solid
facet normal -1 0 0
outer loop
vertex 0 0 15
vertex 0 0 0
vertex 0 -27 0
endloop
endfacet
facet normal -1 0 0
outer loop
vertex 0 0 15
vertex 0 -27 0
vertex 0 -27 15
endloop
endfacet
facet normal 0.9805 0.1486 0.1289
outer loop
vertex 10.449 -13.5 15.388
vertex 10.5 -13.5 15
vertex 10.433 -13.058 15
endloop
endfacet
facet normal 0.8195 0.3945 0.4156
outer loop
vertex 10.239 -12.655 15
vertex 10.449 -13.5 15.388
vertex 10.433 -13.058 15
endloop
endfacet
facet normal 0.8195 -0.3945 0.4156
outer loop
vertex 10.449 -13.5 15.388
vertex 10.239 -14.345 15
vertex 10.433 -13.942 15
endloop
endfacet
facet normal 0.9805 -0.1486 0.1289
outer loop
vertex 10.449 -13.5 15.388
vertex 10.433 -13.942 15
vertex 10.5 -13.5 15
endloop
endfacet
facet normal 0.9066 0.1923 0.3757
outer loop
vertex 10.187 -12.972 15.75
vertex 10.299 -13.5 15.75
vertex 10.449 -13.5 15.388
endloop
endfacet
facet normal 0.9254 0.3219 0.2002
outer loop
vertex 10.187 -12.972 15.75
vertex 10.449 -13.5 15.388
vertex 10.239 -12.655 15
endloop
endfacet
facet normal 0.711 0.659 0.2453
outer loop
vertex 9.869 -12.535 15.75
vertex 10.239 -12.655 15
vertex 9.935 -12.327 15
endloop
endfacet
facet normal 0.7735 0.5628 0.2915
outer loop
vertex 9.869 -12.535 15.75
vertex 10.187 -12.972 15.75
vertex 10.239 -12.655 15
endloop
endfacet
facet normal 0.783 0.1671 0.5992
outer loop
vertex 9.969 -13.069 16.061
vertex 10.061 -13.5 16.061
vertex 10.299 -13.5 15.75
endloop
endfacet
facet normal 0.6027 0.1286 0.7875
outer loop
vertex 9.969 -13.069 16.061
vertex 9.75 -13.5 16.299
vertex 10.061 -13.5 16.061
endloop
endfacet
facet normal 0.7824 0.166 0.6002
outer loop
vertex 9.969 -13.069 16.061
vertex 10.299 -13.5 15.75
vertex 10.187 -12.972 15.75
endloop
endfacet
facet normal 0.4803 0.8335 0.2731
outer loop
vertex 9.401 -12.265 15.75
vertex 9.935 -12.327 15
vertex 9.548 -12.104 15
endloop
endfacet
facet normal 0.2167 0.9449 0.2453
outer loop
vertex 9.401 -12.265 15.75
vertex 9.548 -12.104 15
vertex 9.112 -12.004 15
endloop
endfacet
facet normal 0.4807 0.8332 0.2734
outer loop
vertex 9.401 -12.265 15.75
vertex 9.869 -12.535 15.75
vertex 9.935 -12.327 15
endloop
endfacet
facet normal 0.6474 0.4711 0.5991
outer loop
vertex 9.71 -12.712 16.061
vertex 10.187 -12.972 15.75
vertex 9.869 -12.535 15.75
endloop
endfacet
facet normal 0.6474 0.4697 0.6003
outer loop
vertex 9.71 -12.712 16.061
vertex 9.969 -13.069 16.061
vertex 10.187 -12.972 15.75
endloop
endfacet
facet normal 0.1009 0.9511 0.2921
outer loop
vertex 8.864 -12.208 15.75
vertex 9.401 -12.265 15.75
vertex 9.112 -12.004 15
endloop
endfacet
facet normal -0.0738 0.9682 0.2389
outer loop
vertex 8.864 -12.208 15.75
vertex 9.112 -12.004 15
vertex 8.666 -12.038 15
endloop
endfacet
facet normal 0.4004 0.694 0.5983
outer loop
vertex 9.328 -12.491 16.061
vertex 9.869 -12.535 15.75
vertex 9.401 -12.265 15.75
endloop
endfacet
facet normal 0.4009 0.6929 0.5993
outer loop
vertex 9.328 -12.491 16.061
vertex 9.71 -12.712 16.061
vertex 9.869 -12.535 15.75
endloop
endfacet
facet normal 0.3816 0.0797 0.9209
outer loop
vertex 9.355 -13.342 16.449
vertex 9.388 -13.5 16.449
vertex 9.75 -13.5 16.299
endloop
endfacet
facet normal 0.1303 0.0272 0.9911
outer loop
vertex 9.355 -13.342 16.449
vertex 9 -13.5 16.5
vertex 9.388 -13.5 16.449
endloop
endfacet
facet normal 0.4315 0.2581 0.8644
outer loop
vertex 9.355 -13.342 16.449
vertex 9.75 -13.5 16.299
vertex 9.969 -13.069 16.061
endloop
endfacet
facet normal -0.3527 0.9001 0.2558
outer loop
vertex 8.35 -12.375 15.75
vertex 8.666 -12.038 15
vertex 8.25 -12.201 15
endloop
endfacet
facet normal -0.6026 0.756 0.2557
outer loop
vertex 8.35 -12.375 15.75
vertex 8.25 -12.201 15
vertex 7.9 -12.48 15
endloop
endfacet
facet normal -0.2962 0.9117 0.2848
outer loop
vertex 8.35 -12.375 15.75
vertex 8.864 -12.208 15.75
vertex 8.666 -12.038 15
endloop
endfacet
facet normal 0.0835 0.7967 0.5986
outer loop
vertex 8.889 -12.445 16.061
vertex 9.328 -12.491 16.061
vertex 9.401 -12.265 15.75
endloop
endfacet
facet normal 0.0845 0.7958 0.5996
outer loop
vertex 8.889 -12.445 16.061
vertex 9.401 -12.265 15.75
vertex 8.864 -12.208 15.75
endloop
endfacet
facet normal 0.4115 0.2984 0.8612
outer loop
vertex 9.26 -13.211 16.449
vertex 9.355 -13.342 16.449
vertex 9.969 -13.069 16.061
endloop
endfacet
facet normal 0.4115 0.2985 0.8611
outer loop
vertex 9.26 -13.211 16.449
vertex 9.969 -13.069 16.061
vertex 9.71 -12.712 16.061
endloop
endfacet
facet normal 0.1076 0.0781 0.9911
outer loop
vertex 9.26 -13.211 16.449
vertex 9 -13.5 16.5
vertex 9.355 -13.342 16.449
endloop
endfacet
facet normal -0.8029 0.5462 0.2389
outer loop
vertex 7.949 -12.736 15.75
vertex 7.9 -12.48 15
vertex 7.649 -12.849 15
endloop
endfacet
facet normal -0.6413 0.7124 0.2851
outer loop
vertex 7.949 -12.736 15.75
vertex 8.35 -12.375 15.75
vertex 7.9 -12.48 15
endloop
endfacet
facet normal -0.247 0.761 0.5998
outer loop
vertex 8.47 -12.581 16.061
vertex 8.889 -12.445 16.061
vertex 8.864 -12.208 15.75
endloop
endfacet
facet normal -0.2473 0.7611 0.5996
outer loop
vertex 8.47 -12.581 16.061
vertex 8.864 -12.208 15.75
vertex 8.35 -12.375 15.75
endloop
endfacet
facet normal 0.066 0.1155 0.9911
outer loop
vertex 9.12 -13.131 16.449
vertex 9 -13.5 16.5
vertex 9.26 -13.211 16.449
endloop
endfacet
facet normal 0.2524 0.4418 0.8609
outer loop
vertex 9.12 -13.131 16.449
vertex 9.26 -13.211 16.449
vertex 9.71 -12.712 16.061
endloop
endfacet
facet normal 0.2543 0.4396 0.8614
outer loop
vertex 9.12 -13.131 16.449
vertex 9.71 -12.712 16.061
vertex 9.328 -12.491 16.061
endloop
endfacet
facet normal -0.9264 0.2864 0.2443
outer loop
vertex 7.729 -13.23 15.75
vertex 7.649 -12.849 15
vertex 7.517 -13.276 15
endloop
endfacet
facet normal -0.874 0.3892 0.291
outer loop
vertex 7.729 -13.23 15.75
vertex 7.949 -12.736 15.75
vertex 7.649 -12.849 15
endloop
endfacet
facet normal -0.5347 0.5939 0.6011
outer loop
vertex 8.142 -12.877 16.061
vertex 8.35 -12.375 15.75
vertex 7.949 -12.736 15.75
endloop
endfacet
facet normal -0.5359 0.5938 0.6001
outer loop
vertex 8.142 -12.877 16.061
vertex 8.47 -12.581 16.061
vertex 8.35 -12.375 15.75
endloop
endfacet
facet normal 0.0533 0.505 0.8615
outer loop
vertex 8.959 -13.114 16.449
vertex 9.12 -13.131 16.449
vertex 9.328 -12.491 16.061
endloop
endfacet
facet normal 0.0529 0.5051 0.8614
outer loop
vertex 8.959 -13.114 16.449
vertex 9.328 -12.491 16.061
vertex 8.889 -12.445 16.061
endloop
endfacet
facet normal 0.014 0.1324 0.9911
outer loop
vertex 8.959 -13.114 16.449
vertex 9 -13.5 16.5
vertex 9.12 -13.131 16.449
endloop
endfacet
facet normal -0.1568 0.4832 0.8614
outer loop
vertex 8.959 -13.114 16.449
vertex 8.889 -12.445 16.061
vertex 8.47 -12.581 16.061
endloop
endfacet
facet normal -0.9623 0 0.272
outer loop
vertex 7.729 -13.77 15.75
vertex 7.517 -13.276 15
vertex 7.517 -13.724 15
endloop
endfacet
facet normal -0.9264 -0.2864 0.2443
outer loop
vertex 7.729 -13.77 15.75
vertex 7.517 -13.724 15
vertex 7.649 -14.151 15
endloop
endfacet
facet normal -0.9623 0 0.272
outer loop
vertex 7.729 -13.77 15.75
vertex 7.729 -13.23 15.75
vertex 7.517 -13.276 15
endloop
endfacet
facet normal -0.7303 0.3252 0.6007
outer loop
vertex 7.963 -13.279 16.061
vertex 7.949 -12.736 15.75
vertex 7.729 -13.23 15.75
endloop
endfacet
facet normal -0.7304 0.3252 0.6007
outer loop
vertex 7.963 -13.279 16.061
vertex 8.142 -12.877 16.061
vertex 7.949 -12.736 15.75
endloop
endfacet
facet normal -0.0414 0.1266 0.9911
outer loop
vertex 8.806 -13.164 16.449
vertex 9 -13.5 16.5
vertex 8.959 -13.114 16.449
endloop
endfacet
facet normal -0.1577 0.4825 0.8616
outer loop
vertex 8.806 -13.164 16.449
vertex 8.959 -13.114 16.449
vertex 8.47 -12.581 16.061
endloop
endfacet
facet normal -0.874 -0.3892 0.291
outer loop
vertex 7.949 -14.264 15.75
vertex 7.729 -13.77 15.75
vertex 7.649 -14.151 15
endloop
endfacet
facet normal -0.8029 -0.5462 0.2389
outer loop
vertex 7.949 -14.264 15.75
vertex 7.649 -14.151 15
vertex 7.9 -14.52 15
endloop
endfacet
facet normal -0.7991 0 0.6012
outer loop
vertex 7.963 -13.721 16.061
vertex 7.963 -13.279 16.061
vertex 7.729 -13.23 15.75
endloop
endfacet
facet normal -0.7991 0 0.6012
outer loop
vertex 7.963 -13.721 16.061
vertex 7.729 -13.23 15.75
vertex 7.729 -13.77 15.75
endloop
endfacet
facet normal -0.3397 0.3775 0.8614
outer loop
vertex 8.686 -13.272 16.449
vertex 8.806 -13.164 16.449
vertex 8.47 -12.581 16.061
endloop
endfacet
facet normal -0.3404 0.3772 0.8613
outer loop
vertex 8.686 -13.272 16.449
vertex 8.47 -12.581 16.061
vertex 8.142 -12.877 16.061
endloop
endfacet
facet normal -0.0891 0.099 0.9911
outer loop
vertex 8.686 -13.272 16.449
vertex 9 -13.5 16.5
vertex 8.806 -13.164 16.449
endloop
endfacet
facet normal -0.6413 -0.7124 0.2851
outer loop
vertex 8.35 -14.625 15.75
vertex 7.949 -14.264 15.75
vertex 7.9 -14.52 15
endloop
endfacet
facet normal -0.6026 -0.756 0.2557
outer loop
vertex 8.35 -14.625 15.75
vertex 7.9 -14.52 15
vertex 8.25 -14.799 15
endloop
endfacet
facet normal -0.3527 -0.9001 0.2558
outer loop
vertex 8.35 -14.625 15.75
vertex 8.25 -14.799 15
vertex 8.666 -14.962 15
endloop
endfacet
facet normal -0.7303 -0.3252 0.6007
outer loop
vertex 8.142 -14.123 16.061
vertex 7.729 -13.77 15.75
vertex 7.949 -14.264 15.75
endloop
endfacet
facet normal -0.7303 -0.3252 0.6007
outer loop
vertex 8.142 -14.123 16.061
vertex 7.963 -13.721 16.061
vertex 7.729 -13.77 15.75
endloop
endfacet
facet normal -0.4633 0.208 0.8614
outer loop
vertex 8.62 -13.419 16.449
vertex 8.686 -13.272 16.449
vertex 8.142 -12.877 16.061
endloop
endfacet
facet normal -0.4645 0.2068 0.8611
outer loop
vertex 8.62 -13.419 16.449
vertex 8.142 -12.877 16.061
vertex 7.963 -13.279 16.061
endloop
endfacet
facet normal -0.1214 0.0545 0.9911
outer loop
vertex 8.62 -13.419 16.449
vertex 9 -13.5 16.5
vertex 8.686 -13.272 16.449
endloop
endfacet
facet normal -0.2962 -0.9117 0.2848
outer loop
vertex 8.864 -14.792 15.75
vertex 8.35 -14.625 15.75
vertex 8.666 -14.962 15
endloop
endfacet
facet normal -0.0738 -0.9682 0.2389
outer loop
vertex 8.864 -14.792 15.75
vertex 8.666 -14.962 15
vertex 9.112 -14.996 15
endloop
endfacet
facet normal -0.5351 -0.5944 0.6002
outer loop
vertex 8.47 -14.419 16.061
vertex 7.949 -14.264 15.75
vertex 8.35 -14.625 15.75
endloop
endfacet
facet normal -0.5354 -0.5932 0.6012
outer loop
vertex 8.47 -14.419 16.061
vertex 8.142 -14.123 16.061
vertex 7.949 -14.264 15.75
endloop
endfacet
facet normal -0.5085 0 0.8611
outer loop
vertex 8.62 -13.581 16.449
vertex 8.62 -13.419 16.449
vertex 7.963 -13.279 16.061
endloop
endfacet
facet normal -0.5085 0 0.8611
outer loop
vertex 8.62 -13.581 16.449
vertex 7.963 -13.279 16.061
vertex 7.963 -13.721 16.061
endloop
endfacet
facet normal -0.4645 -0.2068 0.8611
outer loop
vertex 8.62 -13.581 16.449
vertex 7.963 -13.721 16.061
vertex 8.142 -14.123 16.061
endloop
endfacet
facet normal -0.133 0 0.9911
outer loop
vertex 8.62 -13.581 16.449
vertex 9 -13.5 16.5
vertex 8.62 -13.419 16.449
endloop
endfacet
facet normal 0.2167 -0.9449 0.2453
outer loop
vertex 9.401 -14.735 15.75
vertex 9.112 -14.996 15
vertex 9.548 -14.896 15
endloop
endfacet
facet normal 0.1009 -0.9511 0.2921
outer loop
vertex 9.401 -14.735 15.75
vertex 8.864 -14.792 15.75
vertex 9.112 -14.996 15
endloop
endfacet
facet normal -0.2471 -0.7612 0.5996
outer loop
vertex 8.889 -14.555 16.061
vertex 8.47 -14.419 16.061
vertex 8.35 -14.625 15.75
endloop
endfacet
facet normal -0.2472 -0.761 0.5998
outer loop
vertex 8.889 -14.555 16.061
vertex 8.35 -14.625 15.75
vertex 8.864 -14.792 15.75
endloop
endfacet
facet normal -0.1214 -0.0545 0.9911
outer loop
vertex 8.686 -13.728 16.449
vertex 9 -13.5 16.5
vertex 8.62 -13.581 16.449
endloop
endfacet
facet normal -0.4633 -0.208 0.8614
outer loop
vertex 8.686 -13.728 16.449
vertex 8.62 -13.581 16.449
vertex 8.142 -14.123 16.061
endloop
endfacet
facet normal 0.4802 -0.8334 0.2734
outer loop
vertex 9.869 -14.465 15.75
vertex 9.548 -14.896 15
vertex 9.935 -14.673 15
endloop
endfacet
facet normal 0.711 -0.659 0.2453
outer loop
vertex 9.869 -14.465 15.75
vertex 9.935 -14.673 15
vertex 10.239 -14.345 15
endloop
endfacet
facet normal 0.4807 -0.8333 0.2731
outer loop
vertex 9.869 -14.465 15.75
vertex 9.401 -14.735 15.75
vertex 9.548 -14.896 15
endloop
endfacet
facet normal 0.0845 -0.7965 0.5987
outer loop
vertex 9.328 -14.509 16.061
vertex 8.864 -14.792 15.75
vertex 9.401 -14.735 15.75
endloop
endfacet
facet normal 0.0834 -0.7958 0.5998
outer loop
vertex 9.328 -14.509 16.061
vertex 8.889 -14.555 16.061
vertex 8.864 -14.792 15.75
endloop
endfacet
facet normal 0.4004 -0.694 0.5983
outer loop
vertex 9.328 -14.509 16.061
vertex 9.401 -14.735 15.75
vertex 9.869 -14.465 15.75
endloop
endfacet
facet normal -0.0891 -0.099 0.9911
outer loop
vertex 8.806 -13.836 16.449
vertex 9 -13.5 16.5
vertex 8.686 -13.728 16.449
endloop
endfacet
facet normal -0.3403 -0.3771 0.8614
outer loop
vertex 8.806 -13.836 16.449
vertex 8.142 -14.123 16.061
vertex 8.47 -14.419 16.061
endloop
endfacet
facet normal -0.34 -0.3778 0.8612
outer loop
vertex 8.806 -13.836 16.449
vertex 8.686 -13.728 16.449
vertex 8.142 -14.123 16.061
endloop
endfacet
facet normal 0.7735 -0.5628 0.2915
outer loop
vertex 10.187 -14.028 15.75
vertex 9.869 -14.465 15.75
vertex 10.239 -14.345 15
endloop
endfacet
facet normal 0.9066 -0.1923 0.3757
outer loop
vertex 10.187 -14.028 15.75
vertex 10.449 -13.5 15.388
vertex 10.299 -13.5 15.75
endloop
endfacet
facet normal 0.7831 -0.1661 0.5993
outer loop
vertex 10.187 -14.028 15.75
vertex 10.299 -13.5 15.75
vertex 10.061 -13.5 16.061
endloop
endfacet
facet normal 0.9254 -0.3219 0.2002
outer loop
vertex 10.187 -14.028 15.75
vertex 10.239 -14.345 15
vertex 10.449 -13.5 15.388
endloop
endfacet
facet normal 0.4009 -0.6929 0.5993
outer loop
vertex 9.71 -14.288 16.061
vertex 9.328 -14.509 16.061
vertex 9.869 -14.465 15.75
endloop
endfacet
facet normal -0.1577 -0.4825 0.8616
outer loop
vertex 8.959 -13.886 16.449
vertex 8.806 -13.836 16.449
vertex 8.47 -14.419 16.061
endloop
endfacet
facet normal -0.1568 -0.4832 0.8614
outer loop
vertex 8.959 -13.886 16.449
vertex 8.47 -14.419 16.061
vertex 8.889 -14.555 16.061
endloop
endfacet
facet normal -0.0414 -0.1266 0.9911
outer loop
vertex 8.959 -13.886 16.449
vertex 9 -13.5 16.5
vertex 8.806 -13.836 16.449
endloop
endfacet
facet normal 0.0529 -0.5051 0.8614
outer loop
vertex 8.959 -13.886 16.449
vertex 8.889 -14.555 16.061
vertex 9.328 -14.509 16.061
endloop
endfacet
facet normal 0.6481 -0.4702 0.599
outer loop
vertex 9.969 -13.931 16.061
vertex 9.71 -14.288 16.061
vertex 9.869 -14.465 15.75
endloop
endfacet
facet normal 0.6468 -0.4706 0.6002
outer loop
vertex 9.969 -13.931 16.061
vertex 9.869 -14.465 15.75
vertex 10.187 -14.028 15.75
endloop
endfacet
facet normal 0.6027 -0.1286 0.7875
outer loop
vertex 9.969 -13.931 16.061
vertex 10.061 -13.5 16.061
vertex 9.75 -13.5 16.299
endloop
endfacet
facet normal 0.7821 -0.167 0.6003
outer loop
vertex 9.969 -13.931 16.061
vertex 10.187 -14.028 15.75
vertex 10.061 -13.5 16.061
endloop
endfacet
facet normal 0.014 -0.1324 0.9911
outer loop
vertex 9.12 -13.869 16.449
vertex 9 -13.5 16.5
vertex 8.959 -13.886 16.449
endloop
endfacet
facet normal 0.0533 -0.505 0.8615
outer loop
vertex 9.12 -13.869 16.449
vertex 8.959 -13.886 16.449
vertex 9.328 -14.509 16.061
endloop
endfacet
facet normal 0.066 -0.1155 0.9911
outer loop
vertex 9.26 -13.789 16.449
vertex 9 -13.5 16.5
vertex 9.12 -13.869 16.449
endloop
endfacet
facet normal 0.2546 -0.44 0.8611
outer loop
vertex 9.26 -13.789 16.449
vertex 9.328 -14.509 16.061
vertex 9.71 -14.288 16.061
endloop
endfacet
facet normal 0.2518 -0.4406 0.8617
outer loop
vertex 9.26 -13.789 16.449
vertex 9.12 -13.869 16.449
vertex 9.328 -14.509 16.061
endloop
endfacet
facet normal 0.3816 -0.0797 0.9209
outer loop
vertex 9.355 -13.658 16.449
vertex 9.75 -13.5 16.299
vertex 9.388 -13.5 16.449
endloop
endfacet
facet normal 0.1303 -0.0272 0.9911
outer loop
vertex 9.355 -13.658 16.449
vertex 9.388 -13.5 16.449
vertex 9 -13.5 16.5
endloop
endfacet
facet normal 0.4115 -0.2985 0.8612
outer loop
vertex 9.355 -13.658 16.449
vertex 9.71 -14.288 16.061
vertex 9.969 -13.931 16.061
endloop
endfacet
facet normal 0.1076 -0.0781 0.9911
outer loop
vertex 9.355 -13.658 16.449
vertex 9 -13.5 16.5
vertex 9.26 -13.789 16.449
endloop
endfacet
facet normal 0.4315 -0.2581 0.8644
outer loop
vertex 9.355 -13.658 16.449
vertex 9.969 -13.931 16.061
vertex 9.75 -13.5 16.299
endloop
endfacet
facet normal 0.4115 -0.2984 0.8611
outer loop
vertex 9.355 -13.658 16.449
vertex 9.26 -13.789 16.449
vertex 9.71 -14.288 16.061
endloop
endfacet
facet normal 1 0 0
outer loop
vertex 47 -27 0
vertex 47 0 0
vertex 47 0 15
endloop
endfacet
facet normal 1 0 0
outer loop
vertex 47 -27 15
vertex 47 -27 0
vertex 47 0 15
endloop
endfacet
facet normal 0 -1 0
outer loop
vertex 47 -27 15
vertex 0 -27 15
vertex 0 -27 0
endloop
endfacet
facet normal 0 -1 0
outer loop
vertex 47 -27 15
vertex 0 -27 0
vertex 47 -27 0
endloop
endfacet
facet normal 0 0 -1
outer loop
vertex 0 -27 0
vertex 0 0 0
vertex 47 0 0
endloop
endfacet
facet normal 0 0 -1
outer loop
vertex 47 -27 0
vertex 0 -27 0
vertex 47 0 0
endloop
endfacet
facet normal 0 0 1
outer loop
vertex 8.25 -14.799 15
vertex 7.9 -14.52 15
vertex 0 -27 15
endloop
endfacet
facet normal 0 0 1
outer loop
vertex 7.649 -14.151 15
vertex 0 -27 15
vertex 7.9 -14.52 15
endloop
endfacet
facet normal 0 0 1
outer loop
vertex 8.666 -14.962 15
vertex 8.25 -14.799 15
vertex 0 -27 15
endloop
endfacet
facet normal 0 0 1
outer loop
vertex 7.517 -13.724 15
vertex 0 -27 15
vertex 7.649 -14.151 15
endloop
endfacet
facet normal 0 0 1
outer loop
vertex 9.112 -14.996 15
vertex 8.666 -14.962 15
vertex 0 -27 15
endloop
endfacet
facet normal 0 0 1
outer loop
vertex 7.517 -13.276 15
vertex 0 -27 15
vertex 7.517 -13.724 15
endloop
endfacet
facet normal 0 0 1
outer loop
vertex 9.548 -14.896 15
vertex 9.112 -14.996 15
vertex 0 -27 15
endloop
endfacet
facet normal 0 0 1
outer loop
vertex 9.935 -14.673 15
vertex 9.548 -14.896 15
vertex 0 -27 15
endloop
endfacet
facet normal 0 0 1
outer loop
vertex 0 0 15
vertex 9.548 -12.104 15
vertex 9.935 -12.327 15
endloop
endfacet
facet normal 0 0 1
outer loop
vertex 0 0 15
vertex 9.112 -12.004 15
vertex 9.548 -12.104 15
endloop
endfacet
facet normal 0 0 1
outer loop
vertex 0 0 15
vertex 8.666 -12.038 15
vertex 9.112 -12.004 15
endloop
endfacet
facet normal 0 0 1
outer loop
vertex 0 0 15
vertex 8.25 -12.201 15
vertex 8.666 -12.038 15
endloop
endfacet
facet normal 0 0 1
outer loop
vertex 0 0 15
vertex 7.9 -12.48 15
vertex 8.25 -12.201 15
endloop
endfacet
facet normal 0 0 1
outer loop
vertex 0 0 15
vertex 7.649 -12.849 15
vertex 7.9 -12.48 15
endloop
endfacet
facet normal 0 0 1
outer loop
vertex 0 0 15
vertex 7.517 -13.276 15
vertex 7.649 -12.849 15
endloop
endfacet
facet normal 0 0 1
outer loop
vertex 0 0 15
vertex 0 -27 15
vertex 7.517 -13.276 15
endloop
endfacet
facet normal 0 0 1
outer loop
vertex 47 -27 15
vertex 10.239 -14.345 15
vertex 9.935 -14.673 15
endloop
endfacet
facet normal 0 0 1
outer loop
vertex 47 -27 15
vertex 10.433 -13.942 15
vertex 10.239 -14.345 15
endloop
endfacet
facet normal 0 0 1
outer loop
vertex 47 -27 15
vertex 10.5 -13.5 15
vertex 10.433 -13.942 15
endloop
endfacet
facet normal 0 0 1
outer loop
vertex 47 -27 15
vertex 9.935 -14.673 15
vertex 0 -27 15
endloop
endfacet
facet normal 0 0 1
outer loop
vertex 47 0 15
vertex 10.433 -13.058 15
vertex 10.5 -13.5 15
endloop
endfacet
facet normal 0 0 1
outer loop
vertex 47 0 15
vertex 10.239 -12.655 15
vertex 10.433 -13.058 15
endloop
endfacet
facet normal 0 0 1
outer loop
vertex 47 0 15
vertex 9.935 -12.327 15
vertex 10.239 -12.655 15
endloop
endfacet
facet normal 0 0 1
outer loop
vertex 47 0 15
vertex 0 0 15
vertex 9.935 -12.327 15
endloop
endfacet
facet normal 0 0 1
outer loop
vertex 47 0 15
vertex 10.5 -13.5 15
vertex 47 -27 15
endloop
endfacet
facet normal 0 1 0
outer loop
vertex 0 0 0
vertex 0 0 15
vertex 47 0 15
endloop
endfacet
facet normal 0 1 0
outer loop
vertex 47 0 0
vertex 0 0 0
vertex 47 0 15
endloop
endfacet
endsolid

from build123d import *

# Parameters (mm, degrees)
F0_W     = 47
F0_H     = 15
F1_DEPTH = 27
F2_R     = 1.5
F3_DEPTH = 1.5
F4_R     = 1.49999


# Not quite as in the source:
# - a fillet or chamfer is up to 0.001 mm smaller than in the source, because OpenCascade refuses the exact size


with BuildPart() as f1:
    # F0 (on Front) → F1 (new body)
    with BuildSketch(Plane.XZ):
        with Locations((23.5, 7.5)):
            Rectangle(F0_W, F0_H)
    extrude(amount=F1_DEPTH)

    # F2 (on face) → F3 (join)
    with BuildSketch(Plane.XY.offset(15)):
        with Locations((9, -13.5)):
            Circle(F2_R)
    extrude(amount=F3_DEPTH)

    # F4 (radius 1.5 in the source; OpenCascade refuses exactly that, so slightly less here)
    f4_edges = [f1.edges().sort_by_distance(p)[0] for p in [
        (7.5, -13.5, 16.5),
    ]]
    fillet(f4_edges, radius=F4_R)


solid = f1.part
